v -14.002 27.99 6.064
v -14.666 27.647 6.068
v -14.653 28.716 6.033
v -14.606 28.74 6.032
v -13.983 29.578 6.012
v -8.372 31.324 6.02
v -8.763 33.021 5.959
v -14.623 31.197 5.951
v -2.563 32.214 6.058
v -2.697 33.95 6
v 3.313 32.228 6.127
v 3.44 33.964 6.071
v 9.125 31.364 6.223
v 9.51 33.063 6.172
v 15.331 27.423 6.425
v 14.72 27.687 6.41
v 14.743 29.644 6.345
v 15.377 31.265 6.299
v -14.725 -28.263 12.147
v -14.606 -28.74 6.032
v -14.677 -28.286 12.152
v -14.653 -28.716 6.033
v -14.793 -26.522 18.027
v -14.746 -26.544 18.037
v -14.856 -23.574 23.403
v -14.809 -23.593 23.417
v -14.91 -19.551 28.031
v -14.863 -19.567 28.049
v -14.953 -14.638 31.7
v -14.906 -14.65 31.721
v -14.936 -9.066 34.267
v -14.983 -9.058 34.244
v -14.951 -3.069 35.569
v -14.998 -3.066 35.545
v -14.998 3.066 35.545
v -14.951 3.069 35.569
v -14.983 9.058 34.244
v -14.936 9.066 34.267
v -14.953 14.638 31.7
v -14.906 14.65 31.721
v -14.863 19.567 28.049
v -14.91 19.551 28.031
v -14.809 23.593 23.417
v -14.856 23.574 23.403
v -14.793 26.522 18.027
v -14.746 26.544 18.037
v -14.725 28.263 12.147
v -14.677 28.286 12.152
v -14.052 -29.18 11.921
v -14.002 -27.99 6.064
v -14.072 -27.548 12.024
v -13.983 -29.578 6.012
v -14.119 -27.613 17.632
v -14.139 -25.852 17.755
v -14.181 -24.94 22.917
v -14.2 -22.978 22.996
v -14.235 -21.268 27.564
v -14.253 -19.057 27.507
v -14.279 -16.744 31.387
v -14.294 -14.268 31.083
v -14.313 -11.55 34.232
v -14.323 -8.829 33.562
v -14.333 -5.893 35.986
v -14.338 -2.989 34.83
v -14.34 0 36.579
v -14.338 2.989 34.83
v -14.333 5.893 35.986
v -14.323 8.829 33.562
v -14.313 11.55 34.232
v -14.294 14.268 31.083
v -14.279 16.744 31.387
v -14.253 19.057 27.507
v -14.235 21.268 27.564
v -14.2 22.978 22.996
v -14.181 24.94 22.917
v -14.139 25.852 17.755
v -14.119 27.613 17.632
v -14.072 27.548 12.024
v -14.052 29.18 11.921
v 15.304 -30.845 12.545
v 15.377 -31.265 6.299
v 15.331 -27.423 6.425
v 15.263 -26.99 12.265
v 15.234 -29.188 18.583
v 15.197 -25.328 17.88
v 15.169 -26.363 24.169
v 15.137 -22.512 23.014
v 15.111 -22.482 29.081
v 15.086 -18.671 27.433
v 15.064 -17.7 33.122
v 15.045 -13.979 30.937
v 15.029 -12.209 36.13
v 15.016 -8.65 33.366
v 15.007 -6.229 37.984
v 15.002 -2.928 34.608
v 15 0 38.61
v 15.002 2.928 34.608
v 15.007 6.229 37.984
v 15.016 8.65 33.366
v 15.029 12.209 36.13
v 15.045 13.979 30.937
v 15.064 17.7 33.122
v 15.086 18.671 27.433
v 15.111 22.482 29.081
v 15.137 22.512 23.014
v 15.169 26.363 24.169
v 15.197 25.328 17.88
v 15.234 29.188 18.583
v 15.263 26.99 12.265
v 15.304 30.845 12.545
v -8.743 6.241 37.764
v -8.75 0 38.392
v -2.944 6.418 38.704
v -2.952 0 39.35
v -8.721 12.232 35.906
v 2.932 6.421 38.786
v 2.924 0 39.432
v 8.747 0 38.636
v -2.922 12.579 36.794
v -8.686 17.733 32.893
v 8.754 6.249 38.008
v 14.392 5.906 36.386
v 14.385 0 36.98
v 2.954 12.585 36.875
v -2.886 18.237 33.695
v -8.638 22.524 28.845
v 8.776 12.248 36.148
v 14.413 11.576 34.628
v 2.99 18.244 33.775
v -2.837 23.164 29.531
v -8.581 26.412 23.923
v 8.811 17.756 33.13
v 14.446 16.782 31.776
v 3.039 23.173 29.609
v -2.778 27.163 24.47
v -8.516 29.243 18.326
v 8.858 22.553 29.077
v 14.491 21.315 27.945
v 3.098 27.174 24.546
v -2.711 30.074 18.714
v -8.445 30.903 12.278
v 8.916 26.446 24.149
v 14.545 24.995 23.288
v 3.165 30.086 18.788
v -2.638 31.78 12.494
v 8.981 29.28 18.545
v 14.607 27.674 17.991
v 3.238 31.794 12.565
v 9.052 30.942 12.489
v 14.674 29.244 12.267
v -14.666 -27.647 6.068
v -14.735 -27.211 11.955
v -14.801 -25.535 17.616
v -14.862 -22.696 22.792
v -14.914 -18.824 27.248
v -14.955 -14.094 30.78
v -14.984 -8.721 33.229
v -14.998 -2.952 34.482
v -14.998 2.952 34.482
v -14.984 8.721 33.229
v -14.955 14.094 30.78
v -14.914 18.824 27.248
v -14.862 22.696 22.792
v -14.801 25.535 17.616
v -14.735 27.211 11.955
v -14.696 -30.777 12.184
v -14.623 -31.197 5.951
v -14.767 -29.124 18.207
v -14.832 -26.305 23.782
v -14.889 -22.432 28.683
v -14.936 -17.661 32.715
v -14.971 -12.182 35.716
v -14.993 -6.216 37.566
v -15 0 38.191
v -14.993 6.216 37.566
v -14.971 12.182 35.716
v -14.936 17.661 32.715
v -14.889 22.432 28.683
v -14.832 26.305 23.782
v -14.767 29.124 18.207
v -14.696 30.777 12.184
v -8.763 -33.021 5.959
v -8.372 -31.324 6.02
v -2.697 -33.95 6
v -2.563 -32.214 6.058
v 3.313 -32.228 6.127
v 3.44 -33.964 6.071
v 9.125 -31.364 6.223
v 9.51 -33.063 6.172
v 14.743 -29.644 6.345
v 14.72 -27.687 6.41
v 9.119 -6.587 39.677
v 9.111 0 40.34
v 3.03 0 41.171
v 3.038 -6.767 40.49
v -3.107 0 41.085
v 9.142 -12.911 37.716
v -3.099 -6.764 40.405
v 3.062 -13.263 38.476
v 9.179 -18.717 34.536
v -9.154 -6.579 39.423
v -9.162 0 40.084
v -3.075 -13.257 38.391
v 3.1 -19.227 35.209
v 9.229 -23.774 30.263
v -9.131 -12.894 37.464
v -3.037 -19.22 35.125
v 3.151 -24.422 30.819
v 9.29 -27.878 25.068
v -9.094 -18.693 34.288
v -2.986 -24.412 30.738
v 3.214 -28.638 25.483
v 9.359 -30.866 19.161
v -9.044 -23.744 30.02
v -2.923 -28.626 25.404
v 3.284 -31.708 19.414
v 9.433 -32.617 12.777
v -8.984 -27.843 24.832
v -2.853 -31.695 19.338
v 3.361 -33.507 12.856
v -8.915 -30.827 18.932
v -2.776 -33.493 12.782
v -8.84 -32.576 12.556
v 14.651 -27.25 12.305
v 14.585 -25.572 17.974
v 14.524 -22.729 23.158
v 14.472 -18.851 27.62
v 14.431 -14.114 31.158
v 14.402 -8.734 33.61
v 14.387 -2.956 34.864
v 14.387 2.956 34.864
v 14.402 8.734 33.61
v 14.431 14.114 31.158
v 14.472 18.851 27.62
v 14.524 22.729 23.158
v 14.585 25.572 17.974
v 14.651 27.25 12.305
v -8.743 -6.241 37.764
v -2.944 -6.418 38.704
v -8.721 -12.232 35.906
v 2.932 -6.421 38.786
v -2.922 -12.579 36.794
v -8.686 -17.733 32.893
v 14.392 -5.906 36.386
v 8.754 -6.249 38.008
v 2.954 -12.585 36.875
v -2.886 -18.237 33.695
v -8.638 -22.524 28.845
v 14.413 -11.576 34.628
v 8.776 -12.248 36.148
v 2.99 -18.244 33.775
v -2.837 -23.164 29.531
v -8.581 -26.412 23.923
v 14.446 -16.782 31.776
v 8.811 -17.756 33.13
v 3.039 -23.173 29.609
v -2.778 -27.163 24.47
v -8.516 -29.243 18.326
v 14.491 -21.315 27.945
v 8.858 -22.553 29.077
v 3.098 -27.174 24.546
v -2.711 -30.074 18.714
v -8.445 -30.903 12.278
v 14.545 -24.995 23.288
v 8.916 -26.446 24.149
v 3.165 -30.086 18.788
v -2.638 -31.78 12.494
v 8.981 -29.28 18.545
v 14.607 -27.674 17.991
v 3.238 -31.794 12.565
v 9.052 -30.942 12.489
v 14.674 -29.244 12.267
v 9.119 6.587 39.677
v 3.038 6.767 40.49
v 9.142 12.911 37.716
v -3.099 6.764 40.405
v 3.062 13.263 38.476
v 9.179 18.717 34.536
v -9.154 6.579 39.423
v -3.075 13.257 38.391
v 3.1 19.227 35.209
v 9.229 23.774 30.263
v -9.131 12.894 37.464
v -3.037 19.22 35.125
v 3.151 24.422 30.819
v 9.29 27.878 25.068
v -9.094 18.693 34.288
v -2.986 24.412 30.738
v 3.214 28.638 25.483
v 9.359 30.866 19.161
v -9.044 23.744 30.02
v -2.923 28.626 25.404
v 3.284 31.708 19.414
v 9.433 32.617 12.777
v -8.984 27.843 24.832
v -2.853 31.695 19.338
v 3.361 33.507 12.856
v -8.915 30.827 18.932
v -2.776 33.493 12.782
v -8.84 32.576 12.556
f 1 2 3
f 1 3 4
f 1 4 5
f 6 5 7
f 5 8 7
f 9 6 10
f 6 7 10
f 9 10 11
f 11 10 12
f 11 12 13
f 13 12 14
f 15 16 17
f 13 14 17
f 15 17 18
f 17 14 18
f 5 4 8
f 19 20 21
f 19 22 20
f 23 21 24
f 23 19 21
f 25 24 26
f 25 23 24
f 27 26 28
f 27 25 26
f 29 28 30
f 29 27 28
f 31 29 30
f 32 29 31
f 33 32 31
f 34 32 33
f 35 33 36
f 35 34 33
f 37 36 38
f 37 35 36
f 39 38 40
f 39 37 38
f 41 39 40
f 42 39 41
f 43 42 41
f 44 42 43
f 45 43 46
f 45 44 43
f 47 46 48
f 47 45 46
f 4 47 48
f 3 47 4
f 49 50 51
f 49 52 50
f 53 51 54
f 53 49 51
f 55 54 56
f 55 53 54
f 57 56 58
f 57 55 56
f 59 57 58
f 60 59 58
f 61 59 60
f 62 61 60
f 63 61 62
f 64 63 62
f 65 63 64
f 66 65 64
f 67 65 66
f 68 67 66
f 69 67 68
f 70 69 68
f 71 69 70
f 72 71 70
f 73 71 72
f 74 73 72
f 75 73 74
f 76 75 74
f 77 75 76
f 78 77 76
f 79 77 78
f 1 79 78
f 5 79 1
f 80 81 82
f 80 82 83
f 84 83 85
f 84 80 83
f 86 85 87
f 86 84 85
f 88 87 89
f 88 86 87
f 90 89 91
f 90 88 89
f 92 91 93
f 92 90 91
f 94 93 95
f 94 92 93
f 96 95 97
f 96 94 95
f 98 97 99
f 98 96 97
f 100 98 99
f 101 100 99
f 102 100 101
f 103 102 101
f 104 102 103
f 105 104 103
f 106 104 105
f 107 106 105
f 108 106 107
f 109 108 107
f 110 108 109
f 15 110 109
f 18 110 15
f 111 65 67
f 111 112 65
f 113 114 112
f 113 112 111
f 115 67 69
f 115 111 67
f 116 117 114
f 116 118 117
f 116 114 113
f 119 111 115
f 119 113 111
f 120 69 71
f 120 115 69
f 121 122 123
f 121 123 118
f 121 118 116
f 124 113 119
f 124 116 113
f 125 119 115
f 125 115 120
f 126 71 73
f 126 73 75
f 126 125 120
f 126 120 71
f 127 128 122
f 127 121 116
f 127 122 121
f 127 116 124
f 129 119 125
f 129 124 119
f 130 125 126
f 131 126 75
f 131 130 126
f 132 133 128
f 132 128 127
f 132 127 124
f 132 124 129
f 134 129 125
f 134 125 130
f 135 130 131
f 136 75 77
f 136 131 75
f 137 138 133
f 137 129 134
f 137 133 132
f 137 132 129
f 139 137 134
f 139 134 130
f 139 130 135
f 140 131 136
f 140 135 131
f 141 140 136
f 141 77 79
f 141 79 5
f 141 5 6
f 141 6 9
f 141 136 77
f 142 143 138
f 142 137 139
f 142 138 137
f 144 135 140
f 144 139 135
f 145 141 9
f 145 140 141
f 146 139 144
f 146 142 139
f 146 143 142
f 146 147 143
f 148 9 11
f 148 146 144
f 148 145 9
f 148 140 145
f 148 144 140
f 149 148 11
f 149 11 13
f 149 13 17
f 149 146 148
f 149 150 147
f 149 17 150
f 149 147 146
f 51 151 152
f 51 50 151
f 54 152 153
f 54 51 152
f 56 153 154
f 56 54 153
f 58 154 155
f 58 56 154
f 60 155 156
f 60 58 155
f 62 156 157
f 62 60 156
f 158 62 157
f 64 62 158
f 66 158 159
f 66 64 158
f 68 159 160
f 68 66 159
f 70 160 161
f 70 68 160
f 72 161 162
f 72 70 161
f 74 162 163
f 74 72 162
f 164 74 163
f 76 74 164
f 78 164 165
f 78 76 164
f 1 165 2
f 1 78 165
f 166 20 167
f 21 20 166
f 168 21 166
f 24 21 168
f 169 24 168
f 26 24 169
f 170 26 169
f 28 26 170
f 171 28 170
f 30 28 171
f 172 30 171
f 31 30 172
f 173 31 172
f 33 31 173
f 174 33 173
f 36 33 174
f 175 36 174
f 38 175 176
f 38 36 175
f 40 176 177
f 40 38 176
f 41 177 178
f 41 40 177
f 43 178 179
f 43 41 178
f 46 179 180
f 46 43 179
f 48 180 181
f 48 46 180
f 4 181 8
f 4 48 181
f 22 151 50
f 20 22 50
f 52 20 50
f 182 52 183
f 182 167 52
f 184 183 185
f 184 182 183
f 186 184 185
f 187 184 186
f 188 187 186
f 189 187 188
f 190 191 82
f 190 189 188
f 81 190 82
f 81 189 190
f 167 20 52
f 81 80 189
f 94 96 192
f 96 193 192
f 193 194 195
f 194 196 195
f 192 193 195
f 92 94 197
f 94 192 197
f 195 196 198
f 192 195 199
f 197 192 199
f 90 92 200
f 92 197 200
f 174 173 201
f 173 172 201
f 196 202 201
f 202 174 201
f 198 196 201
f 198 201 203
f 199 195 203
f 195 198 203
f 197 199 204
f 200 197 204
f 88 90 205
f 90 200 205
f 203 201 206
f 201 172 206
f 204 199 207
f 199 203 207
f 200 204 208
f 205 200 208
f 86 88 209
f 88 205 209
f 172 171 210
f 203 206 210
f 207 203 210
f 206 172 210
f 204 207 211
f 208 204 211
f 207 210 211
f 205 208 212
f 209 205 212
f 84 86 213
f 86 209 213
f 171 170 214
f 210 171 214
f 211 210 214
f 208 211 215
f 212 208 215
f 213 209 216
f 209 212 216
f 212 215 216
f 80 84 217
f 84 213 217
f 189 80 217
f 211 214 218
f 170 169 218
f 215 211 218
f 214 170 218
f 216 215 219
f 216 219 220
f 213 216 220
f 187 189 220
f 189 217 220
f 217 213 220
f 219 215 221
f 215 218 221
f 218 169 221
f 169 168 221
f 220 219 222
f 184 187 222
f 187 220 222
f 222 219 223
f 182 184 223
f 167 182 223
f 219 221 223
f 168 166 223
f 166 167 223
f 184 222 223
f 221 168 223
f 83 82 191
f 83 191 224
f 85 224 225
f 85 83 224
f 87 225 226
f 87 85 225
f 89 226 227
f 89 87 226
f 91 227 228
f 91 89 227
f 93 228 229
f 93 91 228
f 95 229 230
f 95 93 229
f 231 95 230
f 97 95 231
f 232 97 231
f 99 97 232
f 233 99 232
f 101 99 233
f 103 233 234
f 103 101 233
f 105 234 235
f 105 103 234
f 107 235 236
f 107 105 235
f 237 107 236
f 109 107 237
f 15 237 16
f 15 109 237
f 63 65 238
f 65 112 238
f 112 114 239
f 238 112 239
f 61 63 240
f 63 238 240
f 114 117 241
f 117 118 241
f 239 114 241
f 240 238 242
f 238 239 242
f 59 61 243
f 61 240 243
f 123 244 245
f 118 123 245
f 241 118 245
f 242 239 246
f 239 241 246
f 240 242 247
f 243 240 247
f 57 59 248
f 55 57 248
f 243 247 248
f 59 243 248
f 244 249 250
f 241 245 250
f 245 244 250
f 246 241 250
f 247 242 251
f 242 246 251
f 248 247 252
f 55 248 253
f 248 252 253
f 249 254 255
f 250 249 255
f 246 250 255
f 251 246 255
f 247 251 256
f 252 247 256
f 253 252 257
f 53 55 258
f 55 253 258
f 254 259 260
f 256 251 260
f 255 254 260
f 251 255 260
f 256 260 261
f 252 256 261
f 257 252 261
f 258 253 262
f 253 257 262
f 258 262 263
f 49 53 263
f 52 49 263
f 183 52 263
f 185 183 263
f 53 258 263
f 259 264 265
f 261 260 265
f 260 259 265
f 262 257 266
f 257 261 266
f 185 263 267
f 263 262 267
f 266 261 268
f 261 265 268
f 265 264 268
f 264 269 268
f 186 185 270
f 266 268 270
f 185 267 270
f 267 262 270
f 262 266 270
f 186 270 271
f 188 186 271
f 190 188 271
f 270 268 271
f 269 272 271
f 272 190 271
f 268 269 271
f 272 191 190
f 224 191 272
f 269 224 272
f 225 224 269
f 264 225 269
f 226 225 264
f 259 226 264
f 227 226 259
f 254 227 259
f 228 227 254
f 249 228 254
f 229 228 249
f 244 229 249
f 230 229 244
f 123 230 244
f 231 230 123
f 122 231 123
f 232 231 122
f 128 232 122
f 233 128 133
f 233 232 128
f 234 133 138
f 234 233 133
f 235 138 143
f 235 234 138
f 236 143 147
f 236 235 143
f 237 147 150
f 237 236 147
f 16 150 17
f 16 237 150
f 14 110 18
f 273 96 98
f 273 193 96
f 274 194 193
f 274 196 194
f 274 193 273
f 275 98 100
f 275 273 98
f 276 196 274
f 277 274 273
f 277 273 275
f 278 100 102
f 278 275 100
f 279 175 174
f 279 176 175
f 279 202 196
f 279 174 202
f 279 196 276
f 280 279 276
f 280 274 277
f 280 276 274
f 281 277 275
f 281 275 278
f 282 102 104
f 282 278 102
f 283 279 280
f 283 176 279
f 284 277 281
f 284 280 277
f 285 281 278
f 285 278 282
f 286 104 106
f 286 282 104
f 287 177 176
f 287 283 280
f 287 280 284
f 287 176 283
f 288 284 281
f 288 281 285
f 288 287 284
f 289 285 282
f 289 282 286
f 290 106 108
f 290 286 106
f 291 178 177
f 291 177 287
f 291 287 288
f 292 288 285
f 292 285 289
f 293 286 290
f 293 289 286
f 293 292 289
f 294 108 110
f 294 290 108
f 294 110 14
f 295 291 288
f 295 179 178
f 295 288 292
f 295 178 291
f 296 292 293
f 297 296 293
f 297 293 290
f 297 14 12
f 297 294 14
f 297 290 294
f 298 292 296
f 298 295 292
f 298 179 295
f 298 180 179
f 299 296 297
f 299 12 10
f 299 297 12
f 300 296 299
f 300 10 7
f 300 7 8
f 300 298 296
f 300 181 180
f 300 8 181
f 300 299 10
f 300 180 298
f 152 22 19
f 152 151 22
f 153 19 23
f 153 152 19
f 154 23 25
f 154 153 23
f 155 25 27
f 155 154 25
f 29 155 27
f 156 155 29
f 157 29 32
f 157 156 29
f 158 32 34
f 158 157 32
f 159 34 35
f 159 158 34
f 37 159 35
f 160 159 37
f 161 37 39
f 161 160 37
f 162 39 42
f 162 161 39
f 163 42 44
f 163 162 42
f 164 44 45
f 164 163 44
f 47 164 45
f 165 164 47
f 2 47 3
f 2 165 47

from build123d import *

# Parameters (mm, degrees)
F1_ANGLE = 183.776526


with BuildPart() as f1:
    # F0 (on Front) → F1 (revolve, symmetric)
    with BuildSketch(Plane.XZ) as f1_sk:
        with BuildLine():
            ThreePointArc((15, 38.610307), (-0.039705, 41.242922), (-15, 38.191206))
            Line((-15, 38.191206), (-14.952645, 35.732973))
            Line((-14.952645, 35.732973), (-15, 35.708816))
            Line((-15, 35.708816), (-15, 34.639609))
            Line((-15, 34.639609), (-14.340117, 34.990203))
            Line((-14.340117, 34.990203), (-14.340117, 36.578923))
            ThreePointArc((-14.340117, 36.578923), (-0.01537, 39.500995), (14.385413, 36.98022))
            Line((14.385413, 36.98022), (14.385413, 35.022542))
            Line((14.385413, 35.022542), (15, 34.765044))
            Line((15, 34.765044), (15, 35.966083))
            Line((15, 35.966083), (15, 38.610307))
        make_face()
    revolve(axis=Axis((0.706701, 0, 7.158781), (0.999932, 0, 0.011679)), revolution_arc=F1_ANGLE / 2)
    revolve(f1_sk.sketch, axis=Axis((0.706701, 0, 7.158781), (-0.999932, 0, -0.011679)), revolution_arc=F1_ANGLE / 2)


solid = f1.part
